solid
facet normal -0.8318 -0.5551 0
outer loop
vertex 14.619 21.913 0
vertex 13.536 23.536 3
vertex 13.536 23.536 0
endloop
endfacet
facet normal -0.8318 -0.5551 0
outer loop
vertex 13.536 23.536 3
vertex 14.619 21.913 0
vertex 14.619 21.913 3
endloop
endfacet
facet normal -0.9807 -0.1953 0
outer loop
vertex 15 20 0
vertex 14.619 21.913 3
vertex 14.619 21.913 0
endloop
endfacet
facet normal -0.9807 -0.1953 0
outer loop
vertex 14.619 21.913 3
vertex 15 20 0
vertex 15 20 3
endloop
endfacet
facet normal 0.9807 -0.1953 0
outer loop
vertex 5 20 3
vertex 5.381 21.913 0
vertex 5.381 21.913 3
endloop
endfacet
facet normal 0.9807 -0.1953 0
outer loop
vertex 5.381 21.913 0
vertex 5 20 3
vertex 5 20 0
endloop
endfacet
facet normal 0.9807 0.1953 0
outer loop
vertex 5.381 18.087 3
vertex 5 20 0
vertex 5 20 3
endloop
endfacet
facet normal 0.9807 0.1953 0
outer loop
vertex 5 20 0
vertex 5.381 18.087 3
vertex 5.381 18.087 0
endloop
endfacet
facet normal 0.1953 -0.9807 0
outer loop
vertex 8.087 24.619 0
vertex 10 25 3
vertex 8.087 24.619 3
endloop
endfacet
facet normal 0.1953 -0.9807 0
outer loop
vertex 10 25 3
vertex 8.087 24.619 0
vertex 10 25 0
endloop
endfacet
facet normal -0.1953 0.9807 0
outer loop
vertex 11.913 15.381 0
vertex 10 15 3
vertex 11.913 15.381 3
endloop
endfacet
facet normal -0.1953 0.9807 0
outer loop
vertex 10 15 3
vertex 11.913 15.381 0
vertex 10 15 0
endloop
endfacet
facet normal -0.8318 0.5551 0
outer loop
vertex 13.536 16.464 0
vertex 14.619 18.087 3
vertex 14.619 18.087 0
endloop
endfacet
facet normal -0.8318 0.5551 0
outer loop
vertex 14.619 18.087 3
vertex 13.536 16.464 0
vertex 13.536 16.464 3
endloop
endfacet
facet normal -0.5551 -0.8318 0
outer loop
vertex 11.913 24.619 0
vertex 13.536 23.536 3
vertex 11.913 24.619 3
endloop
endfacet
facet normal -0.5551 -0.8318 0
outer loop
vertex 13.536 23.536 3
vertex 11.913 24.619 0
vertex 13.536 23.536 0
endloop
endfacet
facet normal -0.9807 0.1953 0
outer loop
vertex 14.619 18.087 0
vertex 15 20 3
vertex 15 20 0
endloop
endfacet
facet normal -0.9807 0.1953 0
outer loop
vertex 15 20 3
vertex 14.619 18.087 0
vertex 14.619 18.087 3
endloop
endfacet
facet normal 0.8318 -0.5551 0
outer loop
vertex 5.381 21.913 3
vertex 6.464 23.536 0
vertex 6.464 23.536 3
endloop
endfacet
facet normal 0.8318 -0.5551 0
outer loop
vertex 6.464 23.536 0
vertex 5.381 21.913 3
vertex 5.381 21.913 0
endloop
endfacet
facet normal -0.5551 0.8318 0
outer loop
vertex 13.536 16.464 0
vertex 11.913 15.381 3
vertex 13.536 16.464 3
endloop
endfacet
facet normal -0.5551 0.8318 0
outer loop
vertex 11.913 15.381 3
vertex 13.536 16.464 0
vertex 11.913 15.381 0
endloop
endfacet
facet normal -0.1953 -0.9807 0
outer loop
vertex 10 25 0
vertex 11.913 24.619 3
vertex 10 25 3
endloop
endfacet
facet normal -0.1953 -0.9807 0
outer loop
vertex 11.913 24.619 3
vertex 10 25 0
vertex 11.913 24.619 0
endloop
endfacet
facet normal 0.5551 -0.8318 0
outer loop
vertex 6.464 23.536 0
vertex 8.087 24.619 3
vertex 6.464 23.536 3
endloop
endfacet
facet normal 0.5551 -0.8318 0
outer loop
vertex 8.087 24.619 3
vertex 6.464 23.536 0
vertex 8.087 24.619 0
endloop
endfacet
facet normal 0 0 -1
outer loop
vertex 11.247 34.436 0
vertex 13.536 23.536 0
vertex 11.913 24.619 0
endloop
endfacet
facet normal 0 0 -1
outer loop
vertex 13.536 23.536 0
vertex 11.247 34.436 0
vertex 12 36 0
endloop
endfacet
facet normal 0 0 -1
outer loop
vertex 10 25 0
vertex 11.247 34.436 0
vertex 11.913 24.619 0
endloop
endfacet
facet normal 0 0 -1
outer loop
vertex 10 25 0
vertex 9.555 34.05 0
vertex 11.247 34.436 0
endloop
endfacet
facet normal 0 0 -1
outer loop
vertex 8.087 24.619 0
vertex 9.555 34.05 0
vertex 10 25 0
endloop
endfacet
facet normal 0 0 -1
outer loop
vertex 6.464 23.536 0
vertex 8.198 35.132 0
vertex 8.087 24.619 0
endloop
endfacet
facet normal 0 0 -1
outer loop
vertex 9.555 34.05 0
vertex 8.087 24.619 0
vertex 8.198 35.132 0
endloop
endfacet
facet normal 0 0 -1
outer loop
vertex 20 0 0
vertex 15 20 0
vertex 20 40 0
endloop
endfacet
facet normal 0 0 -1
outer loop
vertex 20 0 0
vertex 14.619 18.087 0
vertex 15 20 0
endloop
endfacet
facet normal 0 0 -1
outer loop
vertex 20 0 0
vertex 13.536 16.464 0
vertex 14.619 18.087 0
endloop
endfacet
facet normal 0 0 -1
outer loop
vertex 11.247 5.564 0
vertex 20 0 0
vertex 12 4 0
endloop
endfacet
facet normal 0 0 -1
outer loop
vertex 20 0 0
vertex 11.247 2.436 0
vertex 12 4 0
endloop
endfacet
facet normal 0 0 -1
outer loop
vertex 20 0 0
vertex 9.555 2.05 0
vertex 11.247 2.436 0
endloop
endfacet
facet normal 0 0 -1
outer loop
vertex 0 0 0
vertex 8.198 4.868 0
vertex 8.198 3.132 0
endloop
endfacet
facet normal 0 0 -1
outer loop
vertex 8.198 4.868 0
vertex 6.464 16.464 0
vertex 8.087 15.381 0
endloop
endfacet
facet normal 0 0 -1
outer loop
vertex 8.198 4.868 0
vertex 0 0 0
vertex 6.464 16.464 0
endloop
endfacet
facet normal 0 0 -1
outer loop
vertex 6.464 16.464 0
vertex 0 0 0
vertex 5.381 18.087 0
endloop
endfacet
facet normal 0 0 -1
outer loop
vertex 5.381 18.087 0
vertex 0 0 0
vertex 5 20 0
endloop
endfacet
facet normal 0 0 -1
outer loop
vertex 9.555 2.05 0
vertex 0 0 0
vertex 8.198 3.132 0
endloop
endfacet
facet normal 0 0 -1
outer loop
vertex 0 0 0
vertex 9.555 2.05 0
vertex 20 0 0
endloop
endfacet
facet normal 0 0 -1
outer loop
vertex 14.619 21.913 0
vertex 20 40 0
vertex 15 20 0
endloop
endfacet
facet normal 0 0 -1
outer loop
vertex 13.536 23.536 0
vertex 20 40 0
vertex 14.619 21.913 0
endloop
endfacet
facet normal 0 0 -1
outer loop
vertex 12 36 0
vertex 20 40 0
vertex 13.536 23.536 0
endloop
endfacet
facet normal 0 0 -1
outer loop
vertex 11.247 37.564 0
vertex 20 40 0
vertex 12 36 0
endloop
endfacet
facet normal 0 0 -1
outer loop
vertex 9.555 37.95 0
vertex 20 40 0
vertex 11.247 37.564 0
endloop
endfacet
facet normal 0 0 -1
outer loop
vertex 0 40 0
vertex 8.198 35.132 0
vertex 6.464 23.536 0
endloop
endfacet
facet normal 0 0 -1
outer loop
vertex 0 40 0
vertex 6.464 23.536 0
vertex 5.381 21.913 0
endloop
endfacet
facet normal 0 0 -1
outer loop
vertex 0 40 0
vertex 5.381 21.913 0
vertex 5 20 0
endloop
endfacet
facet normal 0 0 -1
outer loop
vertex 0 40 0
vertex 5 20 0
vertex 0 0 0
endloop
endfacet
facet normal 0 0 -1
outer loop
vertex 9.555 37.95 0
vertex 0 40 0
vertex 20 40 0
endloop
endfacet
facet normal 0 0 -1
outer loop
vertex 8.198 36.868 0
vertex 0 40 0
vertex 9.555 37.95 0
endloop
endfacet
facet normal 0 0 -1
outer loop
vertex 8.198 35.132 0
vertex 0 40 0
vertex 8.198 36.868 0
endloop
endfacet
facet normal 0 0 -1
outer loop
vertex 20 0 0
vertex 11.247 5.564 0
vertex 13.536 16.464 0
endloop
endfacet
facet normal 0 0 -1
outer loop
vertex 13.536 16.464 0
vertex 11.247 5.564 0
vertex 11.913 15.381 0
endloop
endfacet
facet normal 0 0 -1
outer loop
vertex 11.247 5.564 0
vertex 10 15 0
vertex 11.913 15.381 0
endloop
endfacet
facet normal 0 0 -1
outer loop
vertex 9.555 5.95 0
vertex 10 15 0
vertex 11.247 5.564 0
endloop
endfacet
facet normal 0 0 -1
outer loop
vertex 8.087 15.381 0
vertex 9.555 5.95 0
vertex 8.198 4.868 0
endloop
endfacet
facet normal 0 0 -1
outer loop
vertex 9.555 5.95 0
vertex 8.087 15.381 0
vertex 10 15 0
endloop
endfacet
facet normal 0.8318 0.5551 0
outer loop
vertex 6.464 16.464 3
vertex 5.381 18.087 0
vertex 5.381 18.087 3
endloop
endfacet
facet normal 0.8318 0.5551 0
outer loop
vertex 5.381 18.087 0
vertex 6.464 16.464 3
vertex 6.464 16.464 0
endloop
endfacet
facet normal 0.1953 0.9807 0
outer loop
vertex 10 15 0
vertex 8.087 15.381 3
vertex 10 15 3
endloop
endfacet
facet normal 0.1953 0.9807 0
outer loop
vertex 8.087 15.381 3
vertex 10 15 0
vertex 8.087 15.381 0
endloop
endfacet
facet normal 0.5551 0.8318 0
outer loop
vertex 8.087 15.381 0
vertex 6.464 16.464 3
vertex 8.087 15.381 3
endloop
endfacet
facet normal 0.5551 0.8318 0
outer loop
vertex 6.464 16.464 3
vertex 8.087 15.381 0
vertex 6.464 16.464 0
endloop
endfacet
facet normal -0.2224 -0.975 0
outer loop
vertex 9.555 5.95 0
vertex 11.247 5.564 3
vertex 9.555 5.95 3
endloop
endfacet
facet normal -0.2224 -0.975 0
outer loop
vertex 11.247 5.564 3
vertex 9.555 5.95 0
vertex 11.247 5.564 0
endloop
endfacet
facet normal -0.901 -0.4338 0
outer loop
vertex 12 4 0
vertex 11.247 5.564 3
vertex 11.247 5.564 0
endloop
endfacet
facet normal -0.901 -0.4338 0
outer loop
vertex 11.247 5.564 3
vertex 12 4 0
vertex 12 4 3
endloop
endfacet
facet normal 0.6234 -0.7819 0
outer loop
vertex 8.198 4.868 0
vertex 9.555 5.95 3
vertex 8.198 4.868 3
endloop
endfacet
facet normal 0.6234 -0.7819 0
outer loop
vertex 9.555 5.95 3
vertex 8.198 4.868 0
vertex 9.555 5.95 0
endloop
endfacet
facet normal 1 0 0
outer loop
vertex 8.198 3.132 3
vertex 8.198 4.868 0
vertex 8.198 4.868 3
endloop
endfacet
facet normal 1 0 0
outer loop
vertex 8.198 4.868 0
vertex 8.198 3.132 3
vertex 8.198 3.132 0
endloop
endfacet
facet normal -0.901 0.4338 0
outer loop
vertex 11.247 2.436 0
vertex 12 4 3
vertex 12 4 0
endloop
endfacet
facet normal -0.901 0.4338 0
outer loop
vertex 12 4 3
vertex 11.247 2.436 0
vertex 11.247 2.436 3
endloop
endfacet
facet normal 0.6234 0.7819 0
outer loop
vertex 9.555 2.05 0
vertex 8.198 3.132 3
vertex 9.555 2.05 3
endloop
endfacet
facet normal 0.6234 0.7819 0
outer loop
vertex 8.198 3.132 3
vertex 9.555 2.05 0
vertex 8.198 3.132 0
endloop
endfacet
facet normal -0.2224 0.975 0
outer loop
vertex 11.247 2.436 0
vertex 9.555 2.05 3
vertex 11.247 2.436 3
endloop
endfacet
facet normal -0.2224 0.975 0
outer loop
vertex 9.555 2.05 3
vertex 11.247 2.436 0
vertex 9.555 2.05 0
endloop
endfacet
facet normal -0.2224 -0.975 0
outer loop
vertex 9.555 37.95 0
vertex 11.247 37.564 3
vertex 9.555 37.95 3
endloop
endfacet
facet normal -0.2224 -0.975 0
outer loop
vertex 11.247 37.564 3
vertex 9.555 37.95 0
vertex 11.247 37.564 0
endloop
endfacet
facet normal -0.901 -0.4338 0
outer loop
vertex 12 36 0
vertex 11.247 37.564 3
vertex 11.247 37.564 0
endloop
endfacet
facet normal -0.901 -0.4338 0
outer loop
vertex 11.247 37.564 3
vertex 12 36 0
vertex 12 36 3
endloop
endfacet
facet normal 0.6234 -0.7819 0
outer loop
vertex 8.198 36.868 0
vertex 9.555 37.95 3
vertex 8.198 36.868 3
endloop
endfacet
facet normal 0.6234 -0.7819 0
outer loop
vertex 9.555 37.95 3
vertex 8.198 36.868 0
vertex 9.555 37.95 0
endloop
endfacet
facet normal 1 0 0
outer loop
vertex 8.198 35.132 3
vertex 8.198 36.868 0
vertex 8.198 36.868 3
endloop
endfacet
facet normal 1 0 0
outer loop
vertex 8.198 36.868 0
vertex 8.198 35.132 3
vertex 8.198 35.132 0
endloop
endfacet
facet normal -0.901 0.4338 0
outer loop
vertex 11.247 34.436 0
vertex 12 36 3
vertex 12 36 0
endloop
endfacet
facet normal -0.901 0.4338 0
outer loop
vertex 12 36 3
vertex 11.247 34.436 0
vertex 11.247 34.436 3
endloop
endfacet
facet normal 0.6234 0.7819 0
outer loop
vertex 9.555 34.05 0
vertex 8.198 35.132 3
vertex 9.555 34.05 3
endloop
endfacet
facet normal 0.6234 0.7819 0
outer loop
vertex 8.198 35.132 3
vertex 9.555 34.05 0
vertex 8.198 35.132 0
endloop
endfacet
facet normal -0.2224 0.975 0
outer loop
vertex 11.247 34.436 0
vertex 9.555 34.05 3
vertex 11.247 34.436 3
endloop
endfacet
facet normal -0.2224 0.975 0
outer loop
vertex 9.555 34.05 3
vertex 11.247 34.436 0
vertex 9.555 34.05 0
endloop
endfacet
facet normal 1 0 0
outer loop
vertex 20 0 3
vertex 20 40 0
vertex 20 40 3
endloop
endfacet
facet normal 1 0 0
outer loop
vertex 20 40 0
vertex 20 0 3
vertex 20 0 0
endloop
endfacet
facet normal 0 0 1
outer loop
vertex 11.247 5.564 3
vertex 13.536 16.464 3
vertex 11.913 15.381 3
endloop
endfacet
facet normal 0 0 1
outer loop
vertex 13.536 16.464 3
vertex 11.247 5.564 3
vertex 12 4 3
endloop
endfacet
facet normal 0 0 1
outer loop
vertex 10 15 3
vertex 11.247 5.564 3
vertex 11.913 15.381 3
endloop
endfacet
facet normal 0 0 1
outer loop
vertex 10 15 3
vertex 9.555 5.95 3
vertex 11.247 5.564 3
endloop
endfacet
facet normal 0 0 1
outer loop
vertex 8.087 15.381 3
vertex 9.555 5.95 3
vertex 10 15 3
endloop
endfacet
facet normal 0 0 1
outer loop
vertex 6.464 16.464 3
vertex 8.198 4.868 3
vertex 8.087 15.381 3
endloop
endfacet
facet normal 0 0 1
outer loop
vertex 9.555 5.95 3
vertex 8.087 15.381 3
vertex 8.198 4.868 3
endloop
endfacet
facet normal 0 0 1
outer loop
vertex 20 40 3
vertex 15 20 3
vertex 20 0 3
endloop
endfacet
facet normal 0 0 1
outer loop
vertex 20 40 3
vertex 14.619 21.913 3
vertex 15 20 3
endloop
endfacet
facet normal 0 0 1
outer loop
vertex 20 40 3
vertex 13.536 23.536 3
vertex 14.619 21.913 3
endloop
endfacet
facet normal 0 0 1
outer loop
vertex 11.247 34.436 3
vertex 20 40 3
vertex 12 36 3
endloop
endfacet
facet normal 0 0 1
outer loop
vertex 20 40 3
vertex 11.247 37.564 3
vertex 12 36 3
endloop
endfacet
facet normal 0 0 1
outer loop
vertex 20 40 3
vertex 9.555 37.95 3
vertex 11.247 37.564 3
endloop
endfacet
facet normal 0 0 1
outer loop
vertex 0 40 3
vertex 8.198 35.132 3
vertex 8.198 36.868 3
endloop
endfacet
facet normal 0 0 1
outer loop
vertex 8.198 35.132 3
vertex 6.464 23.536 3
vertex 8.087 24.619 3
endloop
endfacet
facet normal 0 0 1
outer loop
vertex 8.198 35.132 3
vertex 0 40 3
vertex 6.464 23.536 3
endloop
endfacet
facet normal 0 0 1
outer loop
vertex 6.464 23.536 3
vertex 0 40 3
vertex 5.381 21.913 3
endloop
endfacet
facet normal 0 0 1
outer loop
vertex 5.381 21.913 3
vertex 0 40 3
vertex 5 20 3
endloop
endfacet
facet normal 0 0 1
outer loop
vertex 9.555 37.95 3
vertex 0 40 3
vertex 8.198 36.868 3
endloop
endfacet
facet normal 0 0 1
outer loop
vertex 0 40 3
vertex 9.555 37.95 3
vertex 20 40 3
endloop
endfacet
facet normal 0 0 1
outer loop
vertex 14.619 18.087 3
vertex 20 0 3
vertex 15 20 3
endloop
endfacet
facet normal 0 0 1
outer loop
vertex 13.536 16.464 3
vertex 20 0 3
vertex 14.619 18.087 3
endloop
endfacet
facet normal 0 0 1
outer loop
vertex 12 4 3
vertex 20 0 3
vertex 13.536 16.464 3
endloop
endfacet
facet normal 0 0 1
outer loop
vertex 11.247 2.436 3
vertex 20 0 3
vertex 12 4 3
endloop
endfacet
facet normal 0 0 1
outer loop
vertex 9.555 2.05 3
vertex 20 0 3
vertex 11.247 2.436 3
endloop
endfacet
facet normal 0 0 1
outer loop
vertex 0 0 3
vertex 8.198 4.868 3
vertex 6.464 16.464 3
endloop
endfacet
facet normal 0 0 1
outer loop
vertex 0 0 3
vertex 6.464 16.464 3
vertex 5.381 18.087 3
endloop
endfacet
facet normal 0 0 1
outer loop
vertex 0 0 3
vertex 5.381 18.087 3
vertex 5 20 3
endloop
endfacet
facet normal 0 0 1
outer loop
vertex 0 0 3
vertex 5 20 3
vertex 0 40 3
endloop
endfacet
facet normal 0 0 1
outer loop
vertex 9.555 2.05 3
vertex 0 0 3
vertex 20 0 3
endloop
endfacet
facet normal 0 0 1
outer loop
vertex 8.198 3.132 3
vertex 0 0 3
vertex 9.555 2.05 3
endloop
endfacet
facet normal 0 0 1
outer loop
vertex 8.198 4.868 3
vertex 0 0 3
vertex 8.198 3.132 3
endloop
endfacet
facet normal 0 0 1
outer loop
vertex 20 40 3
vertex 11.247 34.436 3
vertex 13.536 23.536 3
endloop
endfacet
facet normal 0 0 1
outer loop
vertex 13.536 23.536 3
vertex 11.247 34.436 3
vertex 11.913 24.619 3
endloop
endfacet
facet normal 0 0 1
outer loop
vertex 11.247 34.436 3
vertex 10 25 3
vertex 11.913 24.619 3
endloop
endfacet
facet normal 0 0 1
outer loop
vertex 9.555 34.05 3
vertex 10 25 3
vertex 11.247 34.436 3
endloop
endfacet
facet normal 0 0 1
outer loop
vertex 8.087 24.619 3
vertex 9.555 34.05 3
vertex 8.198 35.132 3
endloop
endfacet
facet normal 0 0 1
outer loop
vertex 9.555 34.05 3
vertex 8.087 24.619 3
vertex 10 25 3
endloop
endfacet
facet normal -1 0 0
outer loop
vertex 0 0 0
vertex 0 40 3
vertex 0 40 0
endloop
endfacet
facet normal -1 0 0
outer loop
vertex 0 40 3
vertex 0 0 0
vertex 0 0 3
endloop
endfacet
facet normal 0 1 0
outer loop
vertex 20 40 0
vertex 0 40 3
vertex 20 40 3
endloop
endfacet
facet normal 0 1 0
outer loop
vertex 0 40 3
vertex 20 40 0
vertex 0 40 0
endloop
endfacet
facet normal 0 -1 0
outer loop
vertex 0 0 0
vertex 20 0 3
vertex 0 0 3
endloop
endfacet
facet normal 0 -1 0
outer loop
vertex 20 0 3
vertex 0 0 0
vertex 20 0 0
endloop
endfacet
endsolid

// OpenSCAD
difference(){
  cube ([20,40,3]); // block like original
  // sklight mount holes
  translate([10,20,0]){
    cylinder(h = 50, r = 5);
    translate([0,-16,0]){cylinder(h = 50, r = 2);}
    translate([0,16,0]){cylinder(h = 50, r = 2);}
  }
}
